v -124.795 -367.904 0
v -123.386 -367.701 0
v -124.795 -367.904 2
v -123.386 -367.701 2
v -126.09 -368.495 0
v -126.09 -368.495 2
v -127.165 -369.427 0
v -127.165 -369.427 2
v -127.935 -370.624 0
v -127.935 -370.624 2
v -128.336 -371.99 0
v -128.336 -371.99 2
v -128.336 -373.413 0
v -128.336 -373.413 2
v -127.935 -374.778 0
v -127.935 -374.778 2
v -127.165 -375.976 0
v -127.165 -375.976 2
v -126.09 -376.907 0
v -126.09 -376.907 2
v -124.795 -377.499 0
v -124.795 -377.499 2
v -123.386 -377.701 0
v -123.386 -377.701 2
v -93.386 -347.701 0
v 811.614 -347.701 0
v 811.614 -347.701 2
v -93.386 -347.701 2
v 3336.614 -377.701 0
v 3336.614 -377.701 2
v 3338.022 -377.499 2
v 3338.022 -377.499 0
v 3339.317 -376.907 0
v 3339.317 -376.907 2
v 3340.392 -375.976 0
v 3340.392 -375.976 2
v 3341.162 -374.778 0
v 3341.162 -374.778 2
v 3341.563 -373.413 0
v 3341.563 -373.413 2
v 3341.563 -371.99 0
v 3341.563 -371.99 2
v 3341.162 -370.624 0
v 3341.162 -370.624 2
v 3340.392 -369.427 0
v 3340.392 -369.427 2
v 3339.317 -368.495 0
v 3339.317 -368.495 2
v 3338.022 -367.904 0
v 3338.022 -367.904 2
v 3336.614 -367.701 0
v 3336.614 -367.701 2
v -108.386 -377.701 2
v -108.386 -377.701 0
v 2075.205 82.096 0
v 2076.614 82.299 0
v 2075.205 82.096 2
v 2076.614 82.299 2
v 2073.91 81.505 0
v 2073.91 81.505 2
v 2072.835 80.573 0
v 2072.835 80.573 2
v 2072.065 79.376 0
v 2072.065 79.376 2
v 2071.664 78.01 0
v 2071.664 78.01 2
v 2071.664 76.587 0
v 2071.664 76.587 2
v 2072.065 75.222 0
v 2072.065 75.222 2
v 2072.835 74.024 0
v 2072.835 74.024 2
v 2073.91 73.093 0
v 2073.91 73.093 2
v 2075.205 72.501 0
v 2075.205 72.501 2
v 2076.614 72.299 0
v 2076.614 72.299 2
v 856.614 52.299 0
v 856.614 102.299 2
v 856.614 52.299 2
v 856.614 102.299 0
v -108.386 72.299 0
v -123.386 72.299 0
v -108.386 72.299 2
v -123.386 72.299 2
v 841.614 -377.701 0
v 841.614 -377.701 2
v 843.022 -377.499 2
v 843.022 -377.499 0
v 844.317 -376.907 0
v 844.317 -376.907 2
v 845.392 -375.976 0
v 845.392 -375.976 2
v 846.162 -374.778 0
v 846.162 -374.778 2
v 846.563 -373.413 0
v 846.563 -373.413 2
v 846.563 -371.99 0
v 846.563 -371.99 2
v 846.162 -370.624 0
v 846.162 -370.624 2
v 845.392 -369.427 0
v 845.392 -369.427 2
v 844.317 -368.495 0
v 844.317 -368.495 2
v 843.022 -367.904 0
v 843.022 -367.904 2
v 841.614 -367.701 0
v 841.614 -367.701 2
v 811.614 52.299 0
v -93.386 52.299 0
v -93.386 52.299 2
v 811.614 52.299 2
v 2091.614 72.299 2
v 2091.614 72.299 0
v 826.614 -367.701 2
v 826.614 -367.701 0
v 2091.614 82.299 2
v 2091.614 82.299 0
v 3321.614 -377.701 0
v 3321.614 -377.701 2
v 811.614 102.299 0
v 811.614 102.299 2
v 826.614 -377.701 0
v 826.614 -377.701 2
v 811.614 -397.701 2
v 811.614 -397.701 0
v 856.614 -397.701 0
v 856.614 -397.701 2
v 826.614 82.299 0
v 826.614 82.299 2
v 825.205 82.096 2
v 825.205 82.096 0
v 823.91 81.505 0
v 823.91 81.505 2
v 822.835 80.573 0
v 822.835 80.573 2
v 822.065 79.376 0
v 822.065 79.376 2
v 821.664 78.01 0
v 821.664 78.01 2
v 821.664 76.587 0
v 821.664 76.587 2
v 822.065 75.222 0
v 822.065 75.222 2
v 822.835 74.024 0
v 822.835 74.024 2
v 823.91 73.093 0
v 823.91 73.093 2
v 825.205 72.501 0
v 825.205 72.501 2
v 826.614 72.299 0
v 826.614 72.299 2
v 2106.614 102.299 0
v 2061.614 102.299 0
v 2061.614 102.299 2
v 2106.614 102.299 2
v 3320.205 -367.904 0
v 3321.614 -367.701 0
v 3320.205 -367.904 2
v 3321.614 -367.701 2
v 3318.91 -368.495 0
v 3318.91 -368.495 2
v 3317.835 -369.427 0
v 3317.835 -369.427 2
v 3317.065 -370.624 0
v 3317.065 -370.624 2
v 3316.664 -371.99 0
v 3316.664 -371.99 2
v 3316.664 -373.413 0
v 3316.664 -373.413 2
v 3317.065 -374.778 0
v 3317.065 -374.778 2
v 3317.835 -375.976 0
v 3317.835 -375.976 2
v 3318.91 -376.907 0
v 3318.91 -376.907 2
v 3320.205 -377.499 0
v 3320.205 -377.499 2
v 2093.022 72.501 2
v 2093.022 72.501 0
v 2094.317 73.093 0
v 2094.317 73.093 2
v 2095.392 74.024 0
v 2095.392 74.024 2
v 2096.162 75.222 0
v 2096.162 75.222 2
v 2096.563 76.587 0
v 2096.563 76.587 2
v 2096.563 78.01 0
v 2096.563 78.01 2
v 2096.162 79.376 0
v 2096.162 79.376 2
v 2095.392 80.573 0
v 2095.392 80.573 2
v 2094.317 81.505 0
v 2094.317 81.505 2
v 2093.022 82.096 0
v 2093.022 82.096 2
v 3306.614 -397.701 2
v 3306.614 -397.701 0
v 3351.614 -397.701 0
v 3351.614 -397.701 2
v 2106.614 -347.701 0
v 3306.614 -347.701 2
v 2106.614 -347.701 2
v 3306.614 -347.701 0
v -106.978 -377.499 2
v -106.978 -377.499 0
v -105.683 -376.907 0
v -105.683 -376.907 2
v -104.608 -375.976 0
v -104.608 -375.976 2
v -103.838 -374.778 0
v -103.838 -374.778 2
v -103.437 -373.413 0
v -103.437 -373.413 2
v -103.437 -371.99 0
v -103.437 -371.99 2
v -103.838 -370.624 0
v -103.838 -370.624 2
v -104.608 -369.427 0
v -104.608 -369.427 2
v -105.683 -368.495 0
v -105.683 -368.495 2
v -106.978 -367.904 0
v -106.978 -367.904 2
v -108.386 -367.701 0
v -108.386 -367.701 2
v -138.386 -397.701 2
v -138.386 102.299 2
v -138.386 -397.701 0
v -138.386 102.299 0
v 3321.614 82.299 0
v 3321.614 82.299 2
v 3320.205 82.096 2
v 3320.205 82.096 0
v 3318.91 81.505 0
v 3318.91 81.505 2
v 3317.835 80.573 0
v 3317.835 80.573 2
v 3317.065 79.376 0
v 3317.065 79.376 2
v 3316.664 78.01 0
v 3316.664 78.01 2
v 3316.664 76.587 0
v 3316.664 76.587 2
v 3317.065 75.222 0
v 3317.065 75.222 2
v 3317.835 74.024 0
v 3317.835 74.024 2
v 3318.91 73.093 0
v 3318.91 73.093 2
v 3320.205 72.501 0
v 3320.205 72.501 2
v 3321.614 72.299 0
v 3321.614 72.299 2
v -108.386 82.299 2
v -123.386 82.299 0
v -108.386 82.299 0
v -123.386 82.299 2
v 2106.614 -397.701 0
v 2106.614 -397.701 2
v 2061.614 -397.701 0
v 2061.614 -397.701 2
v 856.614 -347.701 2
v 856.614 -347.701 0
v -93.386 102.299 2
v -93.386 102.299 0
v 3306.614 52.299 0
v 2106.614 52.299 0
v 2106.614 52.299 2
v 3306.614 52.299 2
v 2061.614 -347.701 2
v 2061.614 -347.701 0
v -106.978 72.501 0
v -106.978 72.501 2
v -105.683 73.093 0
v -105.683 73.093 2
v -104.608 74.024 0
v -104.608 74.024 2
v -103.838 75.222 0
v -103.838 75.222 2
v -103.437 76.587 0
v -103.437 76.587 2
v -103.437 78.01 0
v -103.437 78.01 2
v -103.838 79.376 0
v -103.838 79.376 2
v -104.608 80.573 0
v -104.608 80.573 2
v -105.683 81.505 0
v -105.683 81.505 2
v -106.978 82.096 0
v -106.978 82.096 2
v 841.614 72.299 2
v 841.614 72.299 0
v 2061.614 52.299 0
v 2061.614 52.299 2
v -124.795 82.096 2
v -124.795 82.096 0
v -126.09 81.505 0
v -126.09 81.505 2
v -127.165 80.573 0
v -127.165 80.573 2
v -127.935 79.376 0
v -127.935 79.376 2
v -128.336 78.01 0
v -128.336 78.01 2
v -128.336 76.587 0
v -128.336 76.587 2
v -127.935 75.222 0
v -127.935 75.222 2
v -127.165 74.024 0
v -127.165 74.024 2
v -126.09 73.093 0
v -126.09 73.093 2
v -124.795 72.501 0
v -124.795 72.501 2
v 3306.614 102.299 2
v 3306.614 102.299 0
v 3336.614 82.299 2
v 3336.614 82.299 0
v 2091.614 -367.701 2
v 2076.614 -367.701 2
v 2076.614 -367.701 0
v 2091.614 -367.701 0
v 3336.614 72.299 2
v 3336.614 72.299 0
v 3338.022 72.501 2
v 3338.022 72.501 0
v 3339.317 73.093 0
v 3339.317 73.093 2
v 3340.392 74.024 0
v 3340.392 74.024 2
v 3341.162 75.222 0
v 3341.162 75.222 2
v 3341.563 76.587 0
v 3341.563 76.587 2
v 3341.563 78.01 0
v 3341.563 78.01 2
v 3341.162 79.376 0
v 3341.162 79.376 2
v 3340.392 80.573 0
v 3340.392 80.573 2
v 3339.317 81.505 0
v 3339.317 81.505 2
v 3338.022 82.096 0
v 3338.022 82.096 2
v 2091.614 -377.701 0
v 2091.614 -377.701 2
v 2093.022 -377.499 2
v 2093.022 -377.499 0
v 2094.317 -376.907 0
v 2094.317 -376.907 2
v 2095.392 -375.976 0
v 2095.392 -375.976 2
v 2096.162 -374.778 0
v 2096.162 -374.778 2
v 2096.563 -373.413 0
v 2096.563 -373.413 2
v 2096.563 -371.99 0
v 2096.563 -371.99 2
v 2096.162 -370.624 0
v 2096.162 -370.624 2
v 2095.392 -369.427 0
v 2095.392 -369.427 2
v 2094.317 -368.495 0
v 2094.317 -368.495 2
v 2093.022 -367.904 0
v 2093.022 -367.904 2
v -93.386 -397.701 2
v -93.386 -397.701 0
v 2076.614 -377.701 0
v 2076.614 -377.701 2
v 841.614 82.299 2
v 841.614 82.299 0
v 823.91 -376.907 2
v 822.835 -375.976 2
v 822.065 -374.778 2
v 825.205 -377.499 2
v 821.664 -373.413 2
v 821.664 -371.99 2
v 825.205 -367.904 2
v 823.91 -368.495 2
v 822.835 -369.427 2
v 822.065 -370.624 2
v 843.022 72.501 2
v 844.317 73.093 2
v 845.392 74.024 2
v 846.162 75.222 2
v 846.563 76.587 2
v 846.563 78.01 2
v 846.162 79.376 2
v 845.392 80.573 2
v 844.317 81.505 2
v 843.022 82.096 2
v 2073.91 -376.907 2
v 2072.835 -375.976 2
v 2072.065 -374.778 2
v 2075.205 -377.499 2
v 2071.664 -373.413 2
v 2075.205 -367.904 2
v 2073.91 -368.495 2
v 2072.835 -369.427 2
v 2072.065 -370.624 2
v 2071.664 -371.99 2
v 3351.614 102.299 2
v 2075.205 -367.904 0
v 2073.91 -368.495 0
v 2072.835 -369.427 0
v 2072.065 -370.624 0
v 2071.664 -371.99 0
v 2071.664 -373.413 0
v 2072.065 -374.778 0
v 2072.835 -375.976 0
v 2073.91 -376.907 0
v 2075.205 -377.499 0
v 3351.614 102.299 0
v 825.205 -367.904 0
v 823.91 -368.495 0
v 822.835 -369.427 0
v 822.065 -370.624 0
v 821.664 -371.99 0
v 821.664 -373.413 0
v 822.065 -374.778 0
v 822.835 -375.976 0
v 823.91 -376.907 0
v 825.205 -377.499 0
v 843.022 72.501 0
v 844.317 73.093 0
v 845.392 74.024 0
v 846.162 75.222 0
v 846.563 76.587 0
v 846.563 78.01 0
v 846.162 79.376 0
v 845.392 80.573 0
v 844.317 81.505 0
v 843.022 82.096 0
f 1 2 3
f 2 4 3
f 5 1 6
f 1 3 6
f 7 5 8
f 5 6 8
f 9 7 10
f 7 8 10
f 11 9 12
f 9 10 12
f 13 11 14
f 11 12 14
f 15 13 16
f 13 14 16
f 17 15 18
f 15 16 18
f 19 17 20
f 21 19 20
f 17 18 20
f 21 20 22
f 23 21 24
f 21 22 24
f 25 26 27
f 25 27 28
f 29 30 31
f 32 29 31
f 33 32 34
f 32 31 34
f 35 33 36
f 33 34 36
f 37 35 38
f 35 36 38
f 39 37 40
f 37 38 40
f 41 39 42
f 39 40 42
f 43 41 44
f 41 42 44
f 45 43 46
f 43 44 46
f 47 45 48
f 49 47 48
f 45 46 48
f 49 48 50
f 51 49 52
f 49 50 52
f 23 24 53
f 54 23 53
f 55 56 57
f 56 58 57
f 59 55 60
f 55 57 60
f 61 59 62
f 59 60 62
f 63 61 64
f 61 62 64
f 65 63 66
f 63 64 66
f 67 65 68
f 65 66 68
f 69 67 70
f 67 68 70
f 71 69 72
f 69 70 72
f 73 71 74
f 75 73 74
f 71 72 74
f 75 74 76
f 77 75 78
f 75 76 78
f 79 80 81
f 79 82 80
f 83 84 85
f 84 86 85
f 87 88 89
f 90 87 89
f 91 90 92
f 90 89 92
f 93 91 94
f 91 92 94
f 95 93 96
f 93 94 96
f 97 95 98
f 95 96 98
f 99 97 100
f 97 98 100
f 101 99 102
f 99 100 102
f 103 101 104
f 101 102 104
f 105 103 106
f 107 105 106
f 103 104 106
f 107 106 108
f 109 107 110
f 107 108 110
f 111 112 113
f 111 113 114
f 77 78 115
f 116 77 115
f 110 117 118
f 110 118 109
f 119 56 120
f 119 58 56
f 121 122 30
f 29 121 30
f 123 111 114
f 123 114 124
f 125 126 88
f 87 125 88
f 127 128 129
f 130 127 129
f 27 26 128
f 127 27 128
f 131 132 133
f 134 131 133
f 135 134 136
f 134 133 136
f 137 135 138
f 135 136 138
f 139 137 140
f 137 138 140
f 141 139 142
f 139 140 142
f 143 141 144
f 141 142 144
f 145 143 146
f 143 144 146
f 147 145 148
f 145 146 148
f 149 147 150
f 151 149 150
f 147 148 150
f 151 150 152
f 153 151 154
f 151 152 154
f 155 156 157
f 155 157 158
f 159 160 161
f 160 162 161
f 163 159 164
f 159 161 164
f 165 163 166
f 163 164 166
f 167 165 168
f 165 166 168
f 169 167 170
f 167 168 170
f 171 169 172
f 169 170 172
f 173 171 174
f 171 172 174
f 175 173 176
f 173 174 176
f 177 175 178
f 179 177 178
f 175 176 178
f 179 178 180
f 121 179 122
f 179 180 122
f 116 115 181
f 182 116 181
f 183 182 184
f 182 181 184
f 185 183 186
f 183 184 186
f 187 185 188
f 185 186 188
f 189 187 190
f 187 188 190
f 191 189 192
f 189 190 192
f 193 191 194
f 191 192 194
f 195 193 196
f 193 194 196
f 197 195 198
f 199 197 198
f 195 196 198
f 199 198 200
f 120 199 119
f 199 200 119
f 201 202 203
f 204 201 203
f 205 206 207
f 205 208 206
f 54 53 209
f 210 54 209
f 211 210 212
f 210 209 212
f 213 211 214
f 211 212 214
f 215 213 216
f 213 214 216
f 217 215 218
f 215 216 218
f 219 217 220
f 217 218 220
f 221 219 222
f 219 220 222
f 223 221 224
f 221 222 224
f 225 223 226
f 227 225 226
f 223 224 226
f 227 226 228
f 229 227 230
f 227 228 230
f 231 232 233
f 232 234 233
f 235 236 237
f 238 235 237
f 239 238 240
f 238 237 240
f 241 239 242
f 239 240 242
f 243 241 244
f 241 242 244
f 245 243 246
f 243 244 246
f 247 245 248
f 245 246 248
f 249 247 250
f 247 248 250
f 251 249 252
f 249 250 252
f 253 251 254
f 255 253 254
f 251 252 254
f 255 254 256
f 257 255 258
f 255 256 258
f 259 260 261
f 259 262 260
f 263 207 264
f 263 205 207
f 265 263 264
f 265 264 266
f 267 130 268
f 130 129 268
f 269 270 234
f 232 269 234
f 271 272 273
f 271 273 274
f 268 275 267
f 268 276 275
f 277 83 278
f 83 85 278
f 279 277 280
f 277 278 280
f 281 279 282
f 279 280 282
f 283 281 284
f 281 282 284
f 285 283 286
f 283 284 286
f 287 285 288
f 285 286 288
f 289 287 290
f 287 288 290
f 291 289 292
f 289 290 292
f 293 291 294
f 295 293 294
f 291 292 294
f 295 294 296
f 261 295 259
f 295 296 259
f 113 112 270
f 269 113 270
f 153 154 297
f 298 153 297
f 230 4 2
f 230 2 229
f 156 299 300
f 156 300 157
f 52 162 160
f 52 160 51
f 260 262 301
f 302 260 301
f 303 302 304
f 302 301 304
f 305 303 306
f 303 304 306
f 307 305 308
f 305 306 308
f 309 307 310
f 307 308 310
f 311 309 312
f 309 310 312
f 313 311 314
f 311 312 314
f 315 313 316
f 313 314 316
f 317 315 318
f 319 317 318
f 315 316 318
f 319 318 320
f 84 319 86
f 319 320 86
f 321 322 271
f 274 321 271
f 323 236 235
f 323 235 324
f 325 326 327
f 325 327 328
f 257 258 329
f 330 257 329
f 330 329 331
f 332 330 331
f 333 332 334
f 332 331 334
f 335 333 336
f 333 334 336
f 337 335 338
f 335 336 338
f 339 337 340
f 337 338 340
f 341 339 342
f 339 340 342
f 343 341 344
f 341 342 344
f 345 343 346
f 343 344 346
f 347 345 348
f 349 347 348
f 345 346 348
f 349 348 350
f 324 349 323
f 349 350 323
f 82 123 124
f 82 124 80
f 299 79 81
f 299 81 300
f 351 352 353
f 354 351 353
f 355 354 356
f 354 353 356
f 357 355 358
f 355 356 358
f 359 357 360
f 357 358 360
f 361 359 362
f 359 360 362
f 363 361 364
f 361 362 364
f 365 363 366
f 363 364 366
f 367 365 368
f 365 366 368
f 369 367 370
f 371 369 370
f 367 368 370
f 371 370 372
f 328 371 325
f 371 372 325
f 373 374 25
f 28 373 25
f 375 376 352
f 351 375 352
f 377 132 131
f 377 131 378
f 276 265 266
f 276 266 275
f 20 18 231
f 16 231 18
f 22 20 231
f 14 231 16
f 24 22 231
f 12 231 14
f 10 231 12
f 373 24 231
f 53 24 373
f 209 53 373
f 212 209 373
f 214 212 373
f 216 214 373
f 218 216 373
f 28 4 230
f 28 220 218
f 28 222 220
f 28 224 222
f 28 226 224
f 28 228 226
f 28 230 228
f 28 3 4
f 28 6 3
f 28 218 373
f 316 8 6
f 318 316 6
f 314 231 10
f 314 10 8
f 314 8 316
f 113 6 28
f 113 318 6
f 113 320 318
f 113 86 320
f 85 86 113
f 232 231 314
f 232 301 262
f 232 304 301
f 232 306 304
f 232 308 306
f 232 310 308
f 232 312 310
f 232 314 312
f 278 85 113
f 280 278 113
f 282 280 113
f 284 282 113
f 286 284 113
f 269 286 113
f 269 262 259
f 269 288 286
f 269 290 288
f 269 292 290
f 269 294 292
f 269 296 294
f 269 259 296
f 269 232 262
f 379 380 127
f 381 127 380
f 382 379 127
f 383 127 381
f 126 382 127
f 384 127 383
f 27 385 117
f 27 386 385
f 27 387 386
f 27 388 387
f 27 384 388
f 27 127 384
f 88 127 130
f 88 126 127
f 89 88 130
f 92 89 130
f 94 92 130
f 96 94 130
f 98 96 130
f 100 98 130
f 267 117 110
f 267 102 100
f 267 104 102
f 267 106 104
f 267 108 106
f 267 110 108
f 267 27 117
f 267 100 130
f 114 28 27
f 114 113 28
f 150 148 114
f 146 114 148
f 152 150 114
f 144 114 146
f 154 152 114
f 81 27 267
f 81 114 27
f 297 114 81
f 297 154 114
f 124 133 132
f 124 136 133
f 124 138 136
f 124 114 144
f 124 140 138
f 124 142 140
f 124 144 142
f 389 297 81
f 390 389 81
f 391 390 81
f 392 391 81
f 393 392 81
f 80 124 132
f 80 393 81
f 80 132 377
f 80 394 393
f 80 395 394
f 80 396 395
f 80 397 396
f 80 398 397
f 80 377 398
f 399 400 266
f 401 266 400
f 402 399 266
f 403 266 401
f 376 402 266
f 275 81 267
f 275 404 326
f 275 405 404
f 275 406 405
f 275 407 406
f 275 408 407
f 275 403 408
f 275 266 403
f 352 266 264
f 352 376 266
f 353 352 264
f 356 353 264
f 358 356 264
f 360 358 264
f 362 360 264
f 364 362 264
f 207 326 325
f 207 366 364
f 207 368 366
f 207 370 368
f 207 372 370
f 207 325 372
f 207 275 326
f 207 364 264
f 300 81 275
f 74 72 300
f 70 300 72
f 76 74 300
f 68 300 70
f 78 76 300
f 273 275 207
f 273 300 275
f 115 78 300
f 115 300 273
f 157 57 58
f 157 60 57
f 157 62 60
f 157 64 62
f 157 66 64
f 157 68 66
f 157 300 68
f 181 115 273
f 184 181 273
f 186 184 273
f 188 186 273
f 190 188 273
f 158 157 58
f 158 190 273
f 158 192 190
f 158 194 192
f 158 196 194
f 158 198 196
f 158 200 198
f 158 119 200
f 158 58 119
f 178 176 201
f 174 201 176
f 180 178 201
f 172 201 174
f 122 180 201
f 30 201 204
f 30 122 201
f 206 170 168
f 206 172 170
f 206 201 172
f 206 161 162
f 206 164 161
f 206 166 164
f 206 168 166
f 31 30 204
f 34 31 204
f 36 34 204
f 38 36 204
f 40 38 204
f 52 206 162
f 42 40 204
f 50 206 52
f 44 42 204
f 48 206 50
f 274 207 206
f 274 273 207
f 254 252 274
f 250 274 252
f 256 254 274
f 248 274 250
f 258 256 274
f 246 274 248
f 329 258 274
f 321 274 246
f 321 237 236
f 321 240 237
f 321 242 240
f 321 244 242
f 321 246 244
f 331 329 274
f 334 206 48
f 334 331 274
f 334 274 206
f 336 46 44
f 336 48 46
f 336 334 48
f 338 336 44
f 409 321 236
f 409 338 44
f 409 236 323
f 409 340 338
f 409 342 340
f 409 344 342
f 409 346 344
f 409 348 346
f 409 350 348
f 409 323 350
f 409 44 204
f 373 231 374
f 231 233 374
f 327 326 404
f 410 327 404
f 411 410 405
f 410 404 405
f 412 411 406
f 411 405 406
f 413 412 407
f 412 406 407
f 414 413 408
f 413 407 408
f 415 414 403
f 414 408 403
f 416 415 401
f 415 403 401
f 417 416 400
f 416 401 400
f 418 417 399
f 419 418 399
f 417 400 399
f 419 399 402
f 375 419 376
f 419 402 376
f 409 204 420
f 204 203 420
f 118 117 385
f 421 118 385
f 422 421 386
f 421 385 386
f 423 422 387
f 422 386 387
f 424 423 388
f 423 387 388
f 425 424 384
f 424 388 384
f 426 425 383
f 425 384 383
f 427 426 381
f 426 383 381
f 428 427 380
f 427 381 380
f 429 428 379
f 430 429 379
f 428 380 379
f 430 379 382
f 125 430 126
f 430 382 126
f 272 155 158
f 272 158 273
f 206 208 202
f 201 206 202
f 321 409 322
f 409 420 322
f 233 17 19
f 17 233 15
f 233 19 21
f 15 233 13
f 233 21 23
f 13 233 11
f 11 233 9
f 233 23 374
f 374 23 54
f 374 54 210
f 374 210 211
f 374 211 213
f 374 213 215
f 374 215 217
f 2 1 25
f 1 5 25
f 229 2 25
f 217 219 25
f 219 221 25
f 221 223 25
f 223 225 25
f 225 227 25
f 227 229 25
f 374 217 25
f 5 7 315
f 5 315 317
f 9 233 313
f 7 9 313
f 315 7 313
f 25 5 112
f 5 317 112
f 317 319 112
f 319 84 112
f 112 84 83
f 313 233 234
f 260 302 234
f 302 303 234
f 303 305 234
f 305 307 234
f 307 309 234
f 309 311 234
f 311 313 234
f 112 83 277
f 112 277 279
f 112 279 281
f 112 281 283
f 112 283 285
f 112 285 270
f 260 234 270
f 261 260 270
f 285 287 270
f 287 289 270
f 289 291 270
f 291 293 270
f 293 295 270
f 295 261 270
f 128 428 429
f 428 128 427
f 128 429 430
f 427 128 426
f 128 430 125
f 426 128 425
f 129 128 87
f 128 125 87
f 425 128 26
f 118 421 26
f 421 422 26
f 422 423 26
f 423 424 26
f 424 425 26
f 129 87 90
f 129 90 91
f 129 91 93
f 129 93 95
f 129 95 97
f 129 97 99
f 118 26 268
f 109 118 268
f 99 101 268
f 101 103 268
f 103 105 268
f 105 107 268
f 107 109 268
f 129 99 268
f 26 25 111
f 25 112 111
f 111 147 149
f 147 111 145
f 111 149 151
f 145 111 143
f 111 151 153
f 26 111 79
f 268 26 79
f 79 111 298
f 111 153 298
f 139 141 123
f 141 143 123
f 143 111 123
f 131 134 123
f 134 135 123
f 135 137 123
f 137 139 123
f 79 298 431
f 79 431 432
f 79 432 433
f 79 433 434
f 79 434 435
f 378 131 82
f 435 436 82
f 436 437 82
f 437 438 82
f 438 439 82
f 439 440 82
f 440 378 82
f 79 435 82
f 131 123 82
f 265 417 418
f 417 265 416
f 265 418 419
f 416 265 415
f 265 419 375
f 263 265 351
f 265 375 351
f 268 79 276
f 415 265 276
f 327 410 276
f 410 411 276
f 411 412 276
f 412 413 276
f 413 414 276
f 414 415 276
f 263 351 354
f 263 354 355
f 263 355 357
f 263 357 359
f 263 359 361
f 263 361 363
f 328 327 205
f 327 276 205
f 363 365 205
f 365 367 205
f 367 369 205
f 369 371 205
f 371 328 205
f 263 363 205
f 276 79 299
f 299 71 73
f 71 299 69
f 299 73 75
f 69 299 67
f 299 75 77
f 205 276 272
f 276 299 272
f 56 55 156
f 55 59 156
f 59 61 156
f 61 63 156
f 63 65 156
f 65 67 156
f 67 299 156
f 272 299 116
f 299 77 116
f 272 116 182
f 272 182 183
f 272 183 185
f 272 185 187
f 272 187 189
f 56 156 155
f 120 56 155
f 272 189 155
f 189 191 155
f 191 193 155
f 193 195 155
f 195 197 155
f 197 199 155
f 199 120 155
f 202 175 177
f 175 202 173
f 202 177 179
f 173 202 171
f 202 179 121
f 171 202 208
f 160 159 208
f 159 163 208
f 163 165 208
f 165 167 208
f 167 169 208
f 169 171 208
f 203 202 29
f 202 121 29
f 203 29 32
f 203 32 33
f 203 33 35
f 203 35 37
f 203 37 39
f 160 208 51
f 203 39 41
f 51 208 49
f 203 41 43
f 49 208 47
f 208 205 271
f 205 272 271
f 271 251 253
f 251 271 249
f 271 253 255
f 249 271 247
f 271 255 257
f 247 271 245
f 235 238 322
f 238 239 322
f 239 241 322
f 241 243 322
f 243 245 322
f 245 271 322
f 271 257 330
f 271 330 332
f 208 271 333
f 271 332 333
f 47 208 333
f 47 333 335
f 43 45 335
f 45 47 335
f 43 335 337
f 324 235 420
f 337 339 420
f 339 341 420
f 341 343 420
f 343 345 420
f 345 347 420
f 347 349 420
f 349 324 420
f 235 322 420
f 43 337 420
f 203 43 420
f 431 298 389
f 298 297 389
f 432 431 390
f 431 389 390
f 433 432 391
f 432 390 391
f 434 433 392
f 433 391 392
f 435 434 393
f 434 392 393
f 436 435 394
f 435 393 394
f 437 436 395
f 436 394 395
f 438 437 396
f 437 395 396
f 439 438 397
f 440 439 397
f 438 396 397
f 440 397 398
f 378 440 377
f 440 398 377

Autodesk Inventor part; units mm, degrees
ref_plane "YZ Plane" through (0, 0, 0) normal (1, 0, 0) x (0, 1, 0)
ref_plane "XZ Plane" through (0, 0, 0) normal (0, 1, 0) x (-1, 0, 0)
ref_plane "XY Plane" through (0, 0, 0) normal (0, 0, 1) x (1, 0, 0)
sketch "Sketch1" plane through (0, 0, 0) normal (0, 0, 1) x (1, 0, 0)
  line L0 (-836.3865, 0) -> (4049.6135, 0) projected
  line L1 (0, -497.7012) -> (0, 202.2988) projected
  line L2 (-93.3865, 52.2988) -> (3306.6135, 52.2988)
  line L3 (3306.6135, 52.2988) -> (3306.6135, -347.7012)
  line L4 (3306.6135, -347.7012) -> (-93.3865, -347.7012)
  line L5 (-93.3865, -347.7012) -> (-93.3865, 52.2988)
  line L6 (-93.3865, 52.2988) -> (-93.3865, 102.2988)
  line L7 (-93.3865, 102.2988) -> (-138.3865, 102.2988)
  line L8 (-138.3865, 102.2988) -> (-138.3865, -397.7012)
  line L9 (-138.3865, -397.7012) -> (-93.3865, -397.7012)
  line L10 (-93.3865, -397.7012) -> (-93.3865, -347.7012)
  line L11 (3306.6135, -347.7012) -> (3306.6135, -397.7012)
  line L12 (3306.6135, -397.7012) -> (3351.6135, -397.7012)
  line L13 (3351.6135, -397.7012) -> (3351.6135, 102.2988)
  line L14 (3351.6135, 102.2988) -> (3306.6135, 102.2988)
  line L15 (3306.6135, 102.2988) -> (3306.6135, 52.2988)
  line L16 (811.6135, 52.2988) -> (811.6135, 102.2988)
  line L17 (811.6135, 102.2988) -> (856.6135, 102.2988)
  line L18 (856.6135, 102.2988) -> (856.6135, 52.2988)
  line L19 (811.6135, 52.2988) -> (811.6135, -347.7012)
  line L20 (811.6135, -397.7012) -> (856.6135, -397.7012)
  line L21 (856.6135, -397.7012) -> (856.6135, -347.7012)
  line L22 (856.6135, 52.2988) -> (856.6135, -347.7012)
  line L23 (811.6135, -347.7012) -> (811.6135, -397.7012)
  line L24 (2061.6135, 52.2988) -> (2061.6135, 102.2988)
  line L25 (2061.6135, 102.2988) -> (2106.6135, 102.2988)
  line L26 (2106.6135, 102.2988) -> (2106.6135, 52.2988)
  line L27 (2106.6135, -347.7012) -> (2106.6135, 52.2988)
  line L28 (2106.6135, -347.7012) -> (2106.6135, -397.7012)
  line L29 (2106.6135, -397.7012) -> (2061.6135, -397.7012)
  line L30 (2061.6135, -397.7012) -> (2061.6135, -347.7012)
  line L31 (2061.6135, -347.7012) -> (2061.6135, 52.2988)
  dimension "d2" = 3400
  dimension "d3" = 400
  dimension "d4" = 50
  dimension "d5" = 45
  dimension "d6" = 500
  dimension "d7" = 50
  dimension "d8" = 45
  dimension "d9" = 45
  dimension "d10" = 905
  dimension "d11" = 45
  dimension "d12" = 50
  dimension "d13" = 1200
extrude "Extrusion1" add sketch "Sketch1" along normal blind 2
sketch "Sketch2" plane through (0, 0, 2) normal (0, 0, 1) x (1, 0, 0)
  line L0 (-123.3865, 82.2988) -> (-108.3865, 82.2988)
  line L1 (-123.3865, 72.2988) -> (-108.3865, 72.2988)
  line L2 (-195.8041, 77.2988) -> (3412.5269, 77.2988) construction
  line L3 (811.6135, 52.2988) -> (-93.3865, 52.2988) construction
  line L4 (-93.3865, 102.2988) -> (-138.3865, 102.2988) construction
  line L5 (-115.8865, 102.2988) -> (-115.8865, -482.0806) construction
  arc A0 (-123.3865, 82.2988) -> (-123.3865, 72.2988) centre (-123.3865, 77.2988) ccw
  arc A1 (-108.3865, 72.2988) -> (-108.3865, 82.2988) centre (-108.3865, 77.2988) ccw
  line L6 (-166.4854, -372.7012) -> (3412.5269, -372.7012) construction
  line L7 (3351.6135, 102.2988) -> (3306.6135, 102.2988) construction
  line L8 (3329.1135, 102.2988) -> (3329.1135, -396.0757) construction
  line L9 (2106.6135, 102.2988) -> (2061.6135, 102.2988) construction
  line L10 (2084.1135, 102.2988) -> (2084.1135, -396.0757) construction
  line L11 (-93.3865, -347.7012) -> (811.6135, -347.7012) construction
  line L12 (-138.3865, 102.2988) -> (-138.3865, -397.7012) construction
  line L13 (-138.3865, -147.7012) -> (3351.6135, -147.7012) construction
  line L14 (3351.6135, -397.7012) -> (3351.6135, 102.2988) construction
  line L15 (856.6135, 102.2988) -> (811.6135, 102.2988) construction
  line L16 (834.1135, 102.2988) -> (834.1135, -392.7012) construction
  line L17 (-123.3865, -367.7012) -> (-108.3865, -367.7012)
  line L18 (-123.3865, -377.7012) -> (-108.3865, -377.7012)
  arc A2 (-123.3865, -367.7012) -> (-123.3865, -377.7012) centre (-123.3865, -372.7012) ccw
  arc A3 (-108.3865, -377.7012) -> (-108.3865, -367.7012) centre (-108.3865, -372.7012) ccw
  line L19 (826.6135, 82.2988) -> (841.6135, 82.2988)
  line L20 (826.6135, 72.2988) -> (841.6135, 72.2988)
  arc A4 (826.6135, 82.2988) -> (826.6135, 72.2988) centre (826.6135, 77.2988) ccw
  arc A5 (841.6135, 72.2988) -> (841.6135, 82.2988) centre (841.6135, 77.2988) ccw
  line L21 (826.6135, -367.7012) -> (841.6135, -367.7012)
  line L22 (826.6135, -377.7012) -> (841.6135, -377.7012)
  arc A6 (826.6135, -367.7012) -> (826.6135, -377.7012) centre (826.6135, -372.7012) ccw
  arc A7 (841.6135, -377.7012) -> (841.6135, -367.7012) centre (841.6135, -372.7012) ccw
  line L23 (2076.6135, 82.2988) -> (2091.6135, 82.2988)
  line L24 (2076.6135, 72.2988) -> (2091.6135, 72.2988)
  arc A8 (2076.6135, 82.2988) -> (2076.6135, 72.2988) centre (2076.6135, 77.2988) ccw
  arc A9 (2091.6135, 72.2988) -> (2091.6135, 82.2988) centre (2091.6135, 77.2988) ccw
  line L25 (2076.6135, -367.7012) -> (2091.6135, -367.7012)
  line L26 (2076.6135, -377.7012) -> (2091.6135, -377.7012)
  arc A10 (2076.6135, -367.7012) -> (2076.6135, -377.7012) centre (2076.6135, -372.7012) ccw
  arc A11 (2091.6135, -377.7012) -> (2091.6135, -367.7012) centre (2091.6135, -372.7012) ccw
  line L27 (3321.6135, 82.2988) -> (3336.6135, 82.2988)
  line L28 (3321.6135, 72.2988) -> (3336.6135, 72.2988)
  arc A12 (3321.6135, 82.2988) -> (3321.6135, 72.2988) centre (3321.6135, 77.2988) ccw
  arc A13 (3336.6135, 72.2988) -> (3336.6135, 82.2988) centre (3336.6135, 77.2988) ccw
  line L29 (3321.6135, -367.7012) -> (3336.6135, -367.7012)
  line L30 (3321.6135, -377.7012) -> (3336.6135, -377.7012)
  arc A14 (3321.6135, -367.7012) -> (3321.6135, -377.7012) centre (3321.6135, -372.7012) ccw
  arc A15 (3336.6135, -377.7012) -> (3336.6135, -367.7012) centre (3336.6135, -372.7012) ccw
  point P0 (0, 0)
  point P1 (-115.8865, 77.2988)
  point P2 (-115.8865, -372.7012)
  point P3 (834.1135, -372.7012)
  point P4 (834.1135, 77.2988)
  point P5 (2084.1135, 77.2988)
  point P6 (2084.1135, -372.7012)
  point P7 (3329.1135, 77.2988)
  point P8 (3329.1135, -372.7012)
  point P9 (-115.8865, -372.7012)
  point P10 (834.1135, 77.2988)
  point P11 (834.1135, -372.7012)
  point P12 (2084.1135, 77.2988)
  point P13 (2084.1135, -372.7012)
  point P14 (3329.1135, 77.2988)
  point P15 (3329.1135, -372.7012)
  dimension "d16" = 15
  dimension "d18" = 15
  dimension "d20" = 0
  dimension "d21" = 0
  dimension "d52" = 25
  dimension "d53" = 25
  dimension "d54" = 15
  dimension "d55" = 15
  dimension "d56" = 0
  dimension "d57" = 0
  dimension "d58" = 15
  dimension "d59" = 15
  dimension "d60" = 0
  dimension "d61" = 0
  dimension "d62" = 15
  dimension "d63" = 15
  dimension "d64" = 0
  dimension "d65" = 0
  dimension "d66" = 15
  dimension "d67" = 15
  dimension "d68" = 0
  dimension "d69" = 0
  dimension "d70" = 15
  dimension "d71" = 15
  dimension "d72" = 0
  dimension "d73" = 0
  dimension "d74" = 15
  dimension "d75" = 15
  dimension "d76" = 0
  dimension "d77" = 0
  dimension "d78" = 15
  dimension "d79" = 15
  dimension "d80" = 0
  dimension "d81" = 0
extrude "Extrusion2" cut sketch "Sketch2" against normal blind 20
properties part number "Baseplate"
